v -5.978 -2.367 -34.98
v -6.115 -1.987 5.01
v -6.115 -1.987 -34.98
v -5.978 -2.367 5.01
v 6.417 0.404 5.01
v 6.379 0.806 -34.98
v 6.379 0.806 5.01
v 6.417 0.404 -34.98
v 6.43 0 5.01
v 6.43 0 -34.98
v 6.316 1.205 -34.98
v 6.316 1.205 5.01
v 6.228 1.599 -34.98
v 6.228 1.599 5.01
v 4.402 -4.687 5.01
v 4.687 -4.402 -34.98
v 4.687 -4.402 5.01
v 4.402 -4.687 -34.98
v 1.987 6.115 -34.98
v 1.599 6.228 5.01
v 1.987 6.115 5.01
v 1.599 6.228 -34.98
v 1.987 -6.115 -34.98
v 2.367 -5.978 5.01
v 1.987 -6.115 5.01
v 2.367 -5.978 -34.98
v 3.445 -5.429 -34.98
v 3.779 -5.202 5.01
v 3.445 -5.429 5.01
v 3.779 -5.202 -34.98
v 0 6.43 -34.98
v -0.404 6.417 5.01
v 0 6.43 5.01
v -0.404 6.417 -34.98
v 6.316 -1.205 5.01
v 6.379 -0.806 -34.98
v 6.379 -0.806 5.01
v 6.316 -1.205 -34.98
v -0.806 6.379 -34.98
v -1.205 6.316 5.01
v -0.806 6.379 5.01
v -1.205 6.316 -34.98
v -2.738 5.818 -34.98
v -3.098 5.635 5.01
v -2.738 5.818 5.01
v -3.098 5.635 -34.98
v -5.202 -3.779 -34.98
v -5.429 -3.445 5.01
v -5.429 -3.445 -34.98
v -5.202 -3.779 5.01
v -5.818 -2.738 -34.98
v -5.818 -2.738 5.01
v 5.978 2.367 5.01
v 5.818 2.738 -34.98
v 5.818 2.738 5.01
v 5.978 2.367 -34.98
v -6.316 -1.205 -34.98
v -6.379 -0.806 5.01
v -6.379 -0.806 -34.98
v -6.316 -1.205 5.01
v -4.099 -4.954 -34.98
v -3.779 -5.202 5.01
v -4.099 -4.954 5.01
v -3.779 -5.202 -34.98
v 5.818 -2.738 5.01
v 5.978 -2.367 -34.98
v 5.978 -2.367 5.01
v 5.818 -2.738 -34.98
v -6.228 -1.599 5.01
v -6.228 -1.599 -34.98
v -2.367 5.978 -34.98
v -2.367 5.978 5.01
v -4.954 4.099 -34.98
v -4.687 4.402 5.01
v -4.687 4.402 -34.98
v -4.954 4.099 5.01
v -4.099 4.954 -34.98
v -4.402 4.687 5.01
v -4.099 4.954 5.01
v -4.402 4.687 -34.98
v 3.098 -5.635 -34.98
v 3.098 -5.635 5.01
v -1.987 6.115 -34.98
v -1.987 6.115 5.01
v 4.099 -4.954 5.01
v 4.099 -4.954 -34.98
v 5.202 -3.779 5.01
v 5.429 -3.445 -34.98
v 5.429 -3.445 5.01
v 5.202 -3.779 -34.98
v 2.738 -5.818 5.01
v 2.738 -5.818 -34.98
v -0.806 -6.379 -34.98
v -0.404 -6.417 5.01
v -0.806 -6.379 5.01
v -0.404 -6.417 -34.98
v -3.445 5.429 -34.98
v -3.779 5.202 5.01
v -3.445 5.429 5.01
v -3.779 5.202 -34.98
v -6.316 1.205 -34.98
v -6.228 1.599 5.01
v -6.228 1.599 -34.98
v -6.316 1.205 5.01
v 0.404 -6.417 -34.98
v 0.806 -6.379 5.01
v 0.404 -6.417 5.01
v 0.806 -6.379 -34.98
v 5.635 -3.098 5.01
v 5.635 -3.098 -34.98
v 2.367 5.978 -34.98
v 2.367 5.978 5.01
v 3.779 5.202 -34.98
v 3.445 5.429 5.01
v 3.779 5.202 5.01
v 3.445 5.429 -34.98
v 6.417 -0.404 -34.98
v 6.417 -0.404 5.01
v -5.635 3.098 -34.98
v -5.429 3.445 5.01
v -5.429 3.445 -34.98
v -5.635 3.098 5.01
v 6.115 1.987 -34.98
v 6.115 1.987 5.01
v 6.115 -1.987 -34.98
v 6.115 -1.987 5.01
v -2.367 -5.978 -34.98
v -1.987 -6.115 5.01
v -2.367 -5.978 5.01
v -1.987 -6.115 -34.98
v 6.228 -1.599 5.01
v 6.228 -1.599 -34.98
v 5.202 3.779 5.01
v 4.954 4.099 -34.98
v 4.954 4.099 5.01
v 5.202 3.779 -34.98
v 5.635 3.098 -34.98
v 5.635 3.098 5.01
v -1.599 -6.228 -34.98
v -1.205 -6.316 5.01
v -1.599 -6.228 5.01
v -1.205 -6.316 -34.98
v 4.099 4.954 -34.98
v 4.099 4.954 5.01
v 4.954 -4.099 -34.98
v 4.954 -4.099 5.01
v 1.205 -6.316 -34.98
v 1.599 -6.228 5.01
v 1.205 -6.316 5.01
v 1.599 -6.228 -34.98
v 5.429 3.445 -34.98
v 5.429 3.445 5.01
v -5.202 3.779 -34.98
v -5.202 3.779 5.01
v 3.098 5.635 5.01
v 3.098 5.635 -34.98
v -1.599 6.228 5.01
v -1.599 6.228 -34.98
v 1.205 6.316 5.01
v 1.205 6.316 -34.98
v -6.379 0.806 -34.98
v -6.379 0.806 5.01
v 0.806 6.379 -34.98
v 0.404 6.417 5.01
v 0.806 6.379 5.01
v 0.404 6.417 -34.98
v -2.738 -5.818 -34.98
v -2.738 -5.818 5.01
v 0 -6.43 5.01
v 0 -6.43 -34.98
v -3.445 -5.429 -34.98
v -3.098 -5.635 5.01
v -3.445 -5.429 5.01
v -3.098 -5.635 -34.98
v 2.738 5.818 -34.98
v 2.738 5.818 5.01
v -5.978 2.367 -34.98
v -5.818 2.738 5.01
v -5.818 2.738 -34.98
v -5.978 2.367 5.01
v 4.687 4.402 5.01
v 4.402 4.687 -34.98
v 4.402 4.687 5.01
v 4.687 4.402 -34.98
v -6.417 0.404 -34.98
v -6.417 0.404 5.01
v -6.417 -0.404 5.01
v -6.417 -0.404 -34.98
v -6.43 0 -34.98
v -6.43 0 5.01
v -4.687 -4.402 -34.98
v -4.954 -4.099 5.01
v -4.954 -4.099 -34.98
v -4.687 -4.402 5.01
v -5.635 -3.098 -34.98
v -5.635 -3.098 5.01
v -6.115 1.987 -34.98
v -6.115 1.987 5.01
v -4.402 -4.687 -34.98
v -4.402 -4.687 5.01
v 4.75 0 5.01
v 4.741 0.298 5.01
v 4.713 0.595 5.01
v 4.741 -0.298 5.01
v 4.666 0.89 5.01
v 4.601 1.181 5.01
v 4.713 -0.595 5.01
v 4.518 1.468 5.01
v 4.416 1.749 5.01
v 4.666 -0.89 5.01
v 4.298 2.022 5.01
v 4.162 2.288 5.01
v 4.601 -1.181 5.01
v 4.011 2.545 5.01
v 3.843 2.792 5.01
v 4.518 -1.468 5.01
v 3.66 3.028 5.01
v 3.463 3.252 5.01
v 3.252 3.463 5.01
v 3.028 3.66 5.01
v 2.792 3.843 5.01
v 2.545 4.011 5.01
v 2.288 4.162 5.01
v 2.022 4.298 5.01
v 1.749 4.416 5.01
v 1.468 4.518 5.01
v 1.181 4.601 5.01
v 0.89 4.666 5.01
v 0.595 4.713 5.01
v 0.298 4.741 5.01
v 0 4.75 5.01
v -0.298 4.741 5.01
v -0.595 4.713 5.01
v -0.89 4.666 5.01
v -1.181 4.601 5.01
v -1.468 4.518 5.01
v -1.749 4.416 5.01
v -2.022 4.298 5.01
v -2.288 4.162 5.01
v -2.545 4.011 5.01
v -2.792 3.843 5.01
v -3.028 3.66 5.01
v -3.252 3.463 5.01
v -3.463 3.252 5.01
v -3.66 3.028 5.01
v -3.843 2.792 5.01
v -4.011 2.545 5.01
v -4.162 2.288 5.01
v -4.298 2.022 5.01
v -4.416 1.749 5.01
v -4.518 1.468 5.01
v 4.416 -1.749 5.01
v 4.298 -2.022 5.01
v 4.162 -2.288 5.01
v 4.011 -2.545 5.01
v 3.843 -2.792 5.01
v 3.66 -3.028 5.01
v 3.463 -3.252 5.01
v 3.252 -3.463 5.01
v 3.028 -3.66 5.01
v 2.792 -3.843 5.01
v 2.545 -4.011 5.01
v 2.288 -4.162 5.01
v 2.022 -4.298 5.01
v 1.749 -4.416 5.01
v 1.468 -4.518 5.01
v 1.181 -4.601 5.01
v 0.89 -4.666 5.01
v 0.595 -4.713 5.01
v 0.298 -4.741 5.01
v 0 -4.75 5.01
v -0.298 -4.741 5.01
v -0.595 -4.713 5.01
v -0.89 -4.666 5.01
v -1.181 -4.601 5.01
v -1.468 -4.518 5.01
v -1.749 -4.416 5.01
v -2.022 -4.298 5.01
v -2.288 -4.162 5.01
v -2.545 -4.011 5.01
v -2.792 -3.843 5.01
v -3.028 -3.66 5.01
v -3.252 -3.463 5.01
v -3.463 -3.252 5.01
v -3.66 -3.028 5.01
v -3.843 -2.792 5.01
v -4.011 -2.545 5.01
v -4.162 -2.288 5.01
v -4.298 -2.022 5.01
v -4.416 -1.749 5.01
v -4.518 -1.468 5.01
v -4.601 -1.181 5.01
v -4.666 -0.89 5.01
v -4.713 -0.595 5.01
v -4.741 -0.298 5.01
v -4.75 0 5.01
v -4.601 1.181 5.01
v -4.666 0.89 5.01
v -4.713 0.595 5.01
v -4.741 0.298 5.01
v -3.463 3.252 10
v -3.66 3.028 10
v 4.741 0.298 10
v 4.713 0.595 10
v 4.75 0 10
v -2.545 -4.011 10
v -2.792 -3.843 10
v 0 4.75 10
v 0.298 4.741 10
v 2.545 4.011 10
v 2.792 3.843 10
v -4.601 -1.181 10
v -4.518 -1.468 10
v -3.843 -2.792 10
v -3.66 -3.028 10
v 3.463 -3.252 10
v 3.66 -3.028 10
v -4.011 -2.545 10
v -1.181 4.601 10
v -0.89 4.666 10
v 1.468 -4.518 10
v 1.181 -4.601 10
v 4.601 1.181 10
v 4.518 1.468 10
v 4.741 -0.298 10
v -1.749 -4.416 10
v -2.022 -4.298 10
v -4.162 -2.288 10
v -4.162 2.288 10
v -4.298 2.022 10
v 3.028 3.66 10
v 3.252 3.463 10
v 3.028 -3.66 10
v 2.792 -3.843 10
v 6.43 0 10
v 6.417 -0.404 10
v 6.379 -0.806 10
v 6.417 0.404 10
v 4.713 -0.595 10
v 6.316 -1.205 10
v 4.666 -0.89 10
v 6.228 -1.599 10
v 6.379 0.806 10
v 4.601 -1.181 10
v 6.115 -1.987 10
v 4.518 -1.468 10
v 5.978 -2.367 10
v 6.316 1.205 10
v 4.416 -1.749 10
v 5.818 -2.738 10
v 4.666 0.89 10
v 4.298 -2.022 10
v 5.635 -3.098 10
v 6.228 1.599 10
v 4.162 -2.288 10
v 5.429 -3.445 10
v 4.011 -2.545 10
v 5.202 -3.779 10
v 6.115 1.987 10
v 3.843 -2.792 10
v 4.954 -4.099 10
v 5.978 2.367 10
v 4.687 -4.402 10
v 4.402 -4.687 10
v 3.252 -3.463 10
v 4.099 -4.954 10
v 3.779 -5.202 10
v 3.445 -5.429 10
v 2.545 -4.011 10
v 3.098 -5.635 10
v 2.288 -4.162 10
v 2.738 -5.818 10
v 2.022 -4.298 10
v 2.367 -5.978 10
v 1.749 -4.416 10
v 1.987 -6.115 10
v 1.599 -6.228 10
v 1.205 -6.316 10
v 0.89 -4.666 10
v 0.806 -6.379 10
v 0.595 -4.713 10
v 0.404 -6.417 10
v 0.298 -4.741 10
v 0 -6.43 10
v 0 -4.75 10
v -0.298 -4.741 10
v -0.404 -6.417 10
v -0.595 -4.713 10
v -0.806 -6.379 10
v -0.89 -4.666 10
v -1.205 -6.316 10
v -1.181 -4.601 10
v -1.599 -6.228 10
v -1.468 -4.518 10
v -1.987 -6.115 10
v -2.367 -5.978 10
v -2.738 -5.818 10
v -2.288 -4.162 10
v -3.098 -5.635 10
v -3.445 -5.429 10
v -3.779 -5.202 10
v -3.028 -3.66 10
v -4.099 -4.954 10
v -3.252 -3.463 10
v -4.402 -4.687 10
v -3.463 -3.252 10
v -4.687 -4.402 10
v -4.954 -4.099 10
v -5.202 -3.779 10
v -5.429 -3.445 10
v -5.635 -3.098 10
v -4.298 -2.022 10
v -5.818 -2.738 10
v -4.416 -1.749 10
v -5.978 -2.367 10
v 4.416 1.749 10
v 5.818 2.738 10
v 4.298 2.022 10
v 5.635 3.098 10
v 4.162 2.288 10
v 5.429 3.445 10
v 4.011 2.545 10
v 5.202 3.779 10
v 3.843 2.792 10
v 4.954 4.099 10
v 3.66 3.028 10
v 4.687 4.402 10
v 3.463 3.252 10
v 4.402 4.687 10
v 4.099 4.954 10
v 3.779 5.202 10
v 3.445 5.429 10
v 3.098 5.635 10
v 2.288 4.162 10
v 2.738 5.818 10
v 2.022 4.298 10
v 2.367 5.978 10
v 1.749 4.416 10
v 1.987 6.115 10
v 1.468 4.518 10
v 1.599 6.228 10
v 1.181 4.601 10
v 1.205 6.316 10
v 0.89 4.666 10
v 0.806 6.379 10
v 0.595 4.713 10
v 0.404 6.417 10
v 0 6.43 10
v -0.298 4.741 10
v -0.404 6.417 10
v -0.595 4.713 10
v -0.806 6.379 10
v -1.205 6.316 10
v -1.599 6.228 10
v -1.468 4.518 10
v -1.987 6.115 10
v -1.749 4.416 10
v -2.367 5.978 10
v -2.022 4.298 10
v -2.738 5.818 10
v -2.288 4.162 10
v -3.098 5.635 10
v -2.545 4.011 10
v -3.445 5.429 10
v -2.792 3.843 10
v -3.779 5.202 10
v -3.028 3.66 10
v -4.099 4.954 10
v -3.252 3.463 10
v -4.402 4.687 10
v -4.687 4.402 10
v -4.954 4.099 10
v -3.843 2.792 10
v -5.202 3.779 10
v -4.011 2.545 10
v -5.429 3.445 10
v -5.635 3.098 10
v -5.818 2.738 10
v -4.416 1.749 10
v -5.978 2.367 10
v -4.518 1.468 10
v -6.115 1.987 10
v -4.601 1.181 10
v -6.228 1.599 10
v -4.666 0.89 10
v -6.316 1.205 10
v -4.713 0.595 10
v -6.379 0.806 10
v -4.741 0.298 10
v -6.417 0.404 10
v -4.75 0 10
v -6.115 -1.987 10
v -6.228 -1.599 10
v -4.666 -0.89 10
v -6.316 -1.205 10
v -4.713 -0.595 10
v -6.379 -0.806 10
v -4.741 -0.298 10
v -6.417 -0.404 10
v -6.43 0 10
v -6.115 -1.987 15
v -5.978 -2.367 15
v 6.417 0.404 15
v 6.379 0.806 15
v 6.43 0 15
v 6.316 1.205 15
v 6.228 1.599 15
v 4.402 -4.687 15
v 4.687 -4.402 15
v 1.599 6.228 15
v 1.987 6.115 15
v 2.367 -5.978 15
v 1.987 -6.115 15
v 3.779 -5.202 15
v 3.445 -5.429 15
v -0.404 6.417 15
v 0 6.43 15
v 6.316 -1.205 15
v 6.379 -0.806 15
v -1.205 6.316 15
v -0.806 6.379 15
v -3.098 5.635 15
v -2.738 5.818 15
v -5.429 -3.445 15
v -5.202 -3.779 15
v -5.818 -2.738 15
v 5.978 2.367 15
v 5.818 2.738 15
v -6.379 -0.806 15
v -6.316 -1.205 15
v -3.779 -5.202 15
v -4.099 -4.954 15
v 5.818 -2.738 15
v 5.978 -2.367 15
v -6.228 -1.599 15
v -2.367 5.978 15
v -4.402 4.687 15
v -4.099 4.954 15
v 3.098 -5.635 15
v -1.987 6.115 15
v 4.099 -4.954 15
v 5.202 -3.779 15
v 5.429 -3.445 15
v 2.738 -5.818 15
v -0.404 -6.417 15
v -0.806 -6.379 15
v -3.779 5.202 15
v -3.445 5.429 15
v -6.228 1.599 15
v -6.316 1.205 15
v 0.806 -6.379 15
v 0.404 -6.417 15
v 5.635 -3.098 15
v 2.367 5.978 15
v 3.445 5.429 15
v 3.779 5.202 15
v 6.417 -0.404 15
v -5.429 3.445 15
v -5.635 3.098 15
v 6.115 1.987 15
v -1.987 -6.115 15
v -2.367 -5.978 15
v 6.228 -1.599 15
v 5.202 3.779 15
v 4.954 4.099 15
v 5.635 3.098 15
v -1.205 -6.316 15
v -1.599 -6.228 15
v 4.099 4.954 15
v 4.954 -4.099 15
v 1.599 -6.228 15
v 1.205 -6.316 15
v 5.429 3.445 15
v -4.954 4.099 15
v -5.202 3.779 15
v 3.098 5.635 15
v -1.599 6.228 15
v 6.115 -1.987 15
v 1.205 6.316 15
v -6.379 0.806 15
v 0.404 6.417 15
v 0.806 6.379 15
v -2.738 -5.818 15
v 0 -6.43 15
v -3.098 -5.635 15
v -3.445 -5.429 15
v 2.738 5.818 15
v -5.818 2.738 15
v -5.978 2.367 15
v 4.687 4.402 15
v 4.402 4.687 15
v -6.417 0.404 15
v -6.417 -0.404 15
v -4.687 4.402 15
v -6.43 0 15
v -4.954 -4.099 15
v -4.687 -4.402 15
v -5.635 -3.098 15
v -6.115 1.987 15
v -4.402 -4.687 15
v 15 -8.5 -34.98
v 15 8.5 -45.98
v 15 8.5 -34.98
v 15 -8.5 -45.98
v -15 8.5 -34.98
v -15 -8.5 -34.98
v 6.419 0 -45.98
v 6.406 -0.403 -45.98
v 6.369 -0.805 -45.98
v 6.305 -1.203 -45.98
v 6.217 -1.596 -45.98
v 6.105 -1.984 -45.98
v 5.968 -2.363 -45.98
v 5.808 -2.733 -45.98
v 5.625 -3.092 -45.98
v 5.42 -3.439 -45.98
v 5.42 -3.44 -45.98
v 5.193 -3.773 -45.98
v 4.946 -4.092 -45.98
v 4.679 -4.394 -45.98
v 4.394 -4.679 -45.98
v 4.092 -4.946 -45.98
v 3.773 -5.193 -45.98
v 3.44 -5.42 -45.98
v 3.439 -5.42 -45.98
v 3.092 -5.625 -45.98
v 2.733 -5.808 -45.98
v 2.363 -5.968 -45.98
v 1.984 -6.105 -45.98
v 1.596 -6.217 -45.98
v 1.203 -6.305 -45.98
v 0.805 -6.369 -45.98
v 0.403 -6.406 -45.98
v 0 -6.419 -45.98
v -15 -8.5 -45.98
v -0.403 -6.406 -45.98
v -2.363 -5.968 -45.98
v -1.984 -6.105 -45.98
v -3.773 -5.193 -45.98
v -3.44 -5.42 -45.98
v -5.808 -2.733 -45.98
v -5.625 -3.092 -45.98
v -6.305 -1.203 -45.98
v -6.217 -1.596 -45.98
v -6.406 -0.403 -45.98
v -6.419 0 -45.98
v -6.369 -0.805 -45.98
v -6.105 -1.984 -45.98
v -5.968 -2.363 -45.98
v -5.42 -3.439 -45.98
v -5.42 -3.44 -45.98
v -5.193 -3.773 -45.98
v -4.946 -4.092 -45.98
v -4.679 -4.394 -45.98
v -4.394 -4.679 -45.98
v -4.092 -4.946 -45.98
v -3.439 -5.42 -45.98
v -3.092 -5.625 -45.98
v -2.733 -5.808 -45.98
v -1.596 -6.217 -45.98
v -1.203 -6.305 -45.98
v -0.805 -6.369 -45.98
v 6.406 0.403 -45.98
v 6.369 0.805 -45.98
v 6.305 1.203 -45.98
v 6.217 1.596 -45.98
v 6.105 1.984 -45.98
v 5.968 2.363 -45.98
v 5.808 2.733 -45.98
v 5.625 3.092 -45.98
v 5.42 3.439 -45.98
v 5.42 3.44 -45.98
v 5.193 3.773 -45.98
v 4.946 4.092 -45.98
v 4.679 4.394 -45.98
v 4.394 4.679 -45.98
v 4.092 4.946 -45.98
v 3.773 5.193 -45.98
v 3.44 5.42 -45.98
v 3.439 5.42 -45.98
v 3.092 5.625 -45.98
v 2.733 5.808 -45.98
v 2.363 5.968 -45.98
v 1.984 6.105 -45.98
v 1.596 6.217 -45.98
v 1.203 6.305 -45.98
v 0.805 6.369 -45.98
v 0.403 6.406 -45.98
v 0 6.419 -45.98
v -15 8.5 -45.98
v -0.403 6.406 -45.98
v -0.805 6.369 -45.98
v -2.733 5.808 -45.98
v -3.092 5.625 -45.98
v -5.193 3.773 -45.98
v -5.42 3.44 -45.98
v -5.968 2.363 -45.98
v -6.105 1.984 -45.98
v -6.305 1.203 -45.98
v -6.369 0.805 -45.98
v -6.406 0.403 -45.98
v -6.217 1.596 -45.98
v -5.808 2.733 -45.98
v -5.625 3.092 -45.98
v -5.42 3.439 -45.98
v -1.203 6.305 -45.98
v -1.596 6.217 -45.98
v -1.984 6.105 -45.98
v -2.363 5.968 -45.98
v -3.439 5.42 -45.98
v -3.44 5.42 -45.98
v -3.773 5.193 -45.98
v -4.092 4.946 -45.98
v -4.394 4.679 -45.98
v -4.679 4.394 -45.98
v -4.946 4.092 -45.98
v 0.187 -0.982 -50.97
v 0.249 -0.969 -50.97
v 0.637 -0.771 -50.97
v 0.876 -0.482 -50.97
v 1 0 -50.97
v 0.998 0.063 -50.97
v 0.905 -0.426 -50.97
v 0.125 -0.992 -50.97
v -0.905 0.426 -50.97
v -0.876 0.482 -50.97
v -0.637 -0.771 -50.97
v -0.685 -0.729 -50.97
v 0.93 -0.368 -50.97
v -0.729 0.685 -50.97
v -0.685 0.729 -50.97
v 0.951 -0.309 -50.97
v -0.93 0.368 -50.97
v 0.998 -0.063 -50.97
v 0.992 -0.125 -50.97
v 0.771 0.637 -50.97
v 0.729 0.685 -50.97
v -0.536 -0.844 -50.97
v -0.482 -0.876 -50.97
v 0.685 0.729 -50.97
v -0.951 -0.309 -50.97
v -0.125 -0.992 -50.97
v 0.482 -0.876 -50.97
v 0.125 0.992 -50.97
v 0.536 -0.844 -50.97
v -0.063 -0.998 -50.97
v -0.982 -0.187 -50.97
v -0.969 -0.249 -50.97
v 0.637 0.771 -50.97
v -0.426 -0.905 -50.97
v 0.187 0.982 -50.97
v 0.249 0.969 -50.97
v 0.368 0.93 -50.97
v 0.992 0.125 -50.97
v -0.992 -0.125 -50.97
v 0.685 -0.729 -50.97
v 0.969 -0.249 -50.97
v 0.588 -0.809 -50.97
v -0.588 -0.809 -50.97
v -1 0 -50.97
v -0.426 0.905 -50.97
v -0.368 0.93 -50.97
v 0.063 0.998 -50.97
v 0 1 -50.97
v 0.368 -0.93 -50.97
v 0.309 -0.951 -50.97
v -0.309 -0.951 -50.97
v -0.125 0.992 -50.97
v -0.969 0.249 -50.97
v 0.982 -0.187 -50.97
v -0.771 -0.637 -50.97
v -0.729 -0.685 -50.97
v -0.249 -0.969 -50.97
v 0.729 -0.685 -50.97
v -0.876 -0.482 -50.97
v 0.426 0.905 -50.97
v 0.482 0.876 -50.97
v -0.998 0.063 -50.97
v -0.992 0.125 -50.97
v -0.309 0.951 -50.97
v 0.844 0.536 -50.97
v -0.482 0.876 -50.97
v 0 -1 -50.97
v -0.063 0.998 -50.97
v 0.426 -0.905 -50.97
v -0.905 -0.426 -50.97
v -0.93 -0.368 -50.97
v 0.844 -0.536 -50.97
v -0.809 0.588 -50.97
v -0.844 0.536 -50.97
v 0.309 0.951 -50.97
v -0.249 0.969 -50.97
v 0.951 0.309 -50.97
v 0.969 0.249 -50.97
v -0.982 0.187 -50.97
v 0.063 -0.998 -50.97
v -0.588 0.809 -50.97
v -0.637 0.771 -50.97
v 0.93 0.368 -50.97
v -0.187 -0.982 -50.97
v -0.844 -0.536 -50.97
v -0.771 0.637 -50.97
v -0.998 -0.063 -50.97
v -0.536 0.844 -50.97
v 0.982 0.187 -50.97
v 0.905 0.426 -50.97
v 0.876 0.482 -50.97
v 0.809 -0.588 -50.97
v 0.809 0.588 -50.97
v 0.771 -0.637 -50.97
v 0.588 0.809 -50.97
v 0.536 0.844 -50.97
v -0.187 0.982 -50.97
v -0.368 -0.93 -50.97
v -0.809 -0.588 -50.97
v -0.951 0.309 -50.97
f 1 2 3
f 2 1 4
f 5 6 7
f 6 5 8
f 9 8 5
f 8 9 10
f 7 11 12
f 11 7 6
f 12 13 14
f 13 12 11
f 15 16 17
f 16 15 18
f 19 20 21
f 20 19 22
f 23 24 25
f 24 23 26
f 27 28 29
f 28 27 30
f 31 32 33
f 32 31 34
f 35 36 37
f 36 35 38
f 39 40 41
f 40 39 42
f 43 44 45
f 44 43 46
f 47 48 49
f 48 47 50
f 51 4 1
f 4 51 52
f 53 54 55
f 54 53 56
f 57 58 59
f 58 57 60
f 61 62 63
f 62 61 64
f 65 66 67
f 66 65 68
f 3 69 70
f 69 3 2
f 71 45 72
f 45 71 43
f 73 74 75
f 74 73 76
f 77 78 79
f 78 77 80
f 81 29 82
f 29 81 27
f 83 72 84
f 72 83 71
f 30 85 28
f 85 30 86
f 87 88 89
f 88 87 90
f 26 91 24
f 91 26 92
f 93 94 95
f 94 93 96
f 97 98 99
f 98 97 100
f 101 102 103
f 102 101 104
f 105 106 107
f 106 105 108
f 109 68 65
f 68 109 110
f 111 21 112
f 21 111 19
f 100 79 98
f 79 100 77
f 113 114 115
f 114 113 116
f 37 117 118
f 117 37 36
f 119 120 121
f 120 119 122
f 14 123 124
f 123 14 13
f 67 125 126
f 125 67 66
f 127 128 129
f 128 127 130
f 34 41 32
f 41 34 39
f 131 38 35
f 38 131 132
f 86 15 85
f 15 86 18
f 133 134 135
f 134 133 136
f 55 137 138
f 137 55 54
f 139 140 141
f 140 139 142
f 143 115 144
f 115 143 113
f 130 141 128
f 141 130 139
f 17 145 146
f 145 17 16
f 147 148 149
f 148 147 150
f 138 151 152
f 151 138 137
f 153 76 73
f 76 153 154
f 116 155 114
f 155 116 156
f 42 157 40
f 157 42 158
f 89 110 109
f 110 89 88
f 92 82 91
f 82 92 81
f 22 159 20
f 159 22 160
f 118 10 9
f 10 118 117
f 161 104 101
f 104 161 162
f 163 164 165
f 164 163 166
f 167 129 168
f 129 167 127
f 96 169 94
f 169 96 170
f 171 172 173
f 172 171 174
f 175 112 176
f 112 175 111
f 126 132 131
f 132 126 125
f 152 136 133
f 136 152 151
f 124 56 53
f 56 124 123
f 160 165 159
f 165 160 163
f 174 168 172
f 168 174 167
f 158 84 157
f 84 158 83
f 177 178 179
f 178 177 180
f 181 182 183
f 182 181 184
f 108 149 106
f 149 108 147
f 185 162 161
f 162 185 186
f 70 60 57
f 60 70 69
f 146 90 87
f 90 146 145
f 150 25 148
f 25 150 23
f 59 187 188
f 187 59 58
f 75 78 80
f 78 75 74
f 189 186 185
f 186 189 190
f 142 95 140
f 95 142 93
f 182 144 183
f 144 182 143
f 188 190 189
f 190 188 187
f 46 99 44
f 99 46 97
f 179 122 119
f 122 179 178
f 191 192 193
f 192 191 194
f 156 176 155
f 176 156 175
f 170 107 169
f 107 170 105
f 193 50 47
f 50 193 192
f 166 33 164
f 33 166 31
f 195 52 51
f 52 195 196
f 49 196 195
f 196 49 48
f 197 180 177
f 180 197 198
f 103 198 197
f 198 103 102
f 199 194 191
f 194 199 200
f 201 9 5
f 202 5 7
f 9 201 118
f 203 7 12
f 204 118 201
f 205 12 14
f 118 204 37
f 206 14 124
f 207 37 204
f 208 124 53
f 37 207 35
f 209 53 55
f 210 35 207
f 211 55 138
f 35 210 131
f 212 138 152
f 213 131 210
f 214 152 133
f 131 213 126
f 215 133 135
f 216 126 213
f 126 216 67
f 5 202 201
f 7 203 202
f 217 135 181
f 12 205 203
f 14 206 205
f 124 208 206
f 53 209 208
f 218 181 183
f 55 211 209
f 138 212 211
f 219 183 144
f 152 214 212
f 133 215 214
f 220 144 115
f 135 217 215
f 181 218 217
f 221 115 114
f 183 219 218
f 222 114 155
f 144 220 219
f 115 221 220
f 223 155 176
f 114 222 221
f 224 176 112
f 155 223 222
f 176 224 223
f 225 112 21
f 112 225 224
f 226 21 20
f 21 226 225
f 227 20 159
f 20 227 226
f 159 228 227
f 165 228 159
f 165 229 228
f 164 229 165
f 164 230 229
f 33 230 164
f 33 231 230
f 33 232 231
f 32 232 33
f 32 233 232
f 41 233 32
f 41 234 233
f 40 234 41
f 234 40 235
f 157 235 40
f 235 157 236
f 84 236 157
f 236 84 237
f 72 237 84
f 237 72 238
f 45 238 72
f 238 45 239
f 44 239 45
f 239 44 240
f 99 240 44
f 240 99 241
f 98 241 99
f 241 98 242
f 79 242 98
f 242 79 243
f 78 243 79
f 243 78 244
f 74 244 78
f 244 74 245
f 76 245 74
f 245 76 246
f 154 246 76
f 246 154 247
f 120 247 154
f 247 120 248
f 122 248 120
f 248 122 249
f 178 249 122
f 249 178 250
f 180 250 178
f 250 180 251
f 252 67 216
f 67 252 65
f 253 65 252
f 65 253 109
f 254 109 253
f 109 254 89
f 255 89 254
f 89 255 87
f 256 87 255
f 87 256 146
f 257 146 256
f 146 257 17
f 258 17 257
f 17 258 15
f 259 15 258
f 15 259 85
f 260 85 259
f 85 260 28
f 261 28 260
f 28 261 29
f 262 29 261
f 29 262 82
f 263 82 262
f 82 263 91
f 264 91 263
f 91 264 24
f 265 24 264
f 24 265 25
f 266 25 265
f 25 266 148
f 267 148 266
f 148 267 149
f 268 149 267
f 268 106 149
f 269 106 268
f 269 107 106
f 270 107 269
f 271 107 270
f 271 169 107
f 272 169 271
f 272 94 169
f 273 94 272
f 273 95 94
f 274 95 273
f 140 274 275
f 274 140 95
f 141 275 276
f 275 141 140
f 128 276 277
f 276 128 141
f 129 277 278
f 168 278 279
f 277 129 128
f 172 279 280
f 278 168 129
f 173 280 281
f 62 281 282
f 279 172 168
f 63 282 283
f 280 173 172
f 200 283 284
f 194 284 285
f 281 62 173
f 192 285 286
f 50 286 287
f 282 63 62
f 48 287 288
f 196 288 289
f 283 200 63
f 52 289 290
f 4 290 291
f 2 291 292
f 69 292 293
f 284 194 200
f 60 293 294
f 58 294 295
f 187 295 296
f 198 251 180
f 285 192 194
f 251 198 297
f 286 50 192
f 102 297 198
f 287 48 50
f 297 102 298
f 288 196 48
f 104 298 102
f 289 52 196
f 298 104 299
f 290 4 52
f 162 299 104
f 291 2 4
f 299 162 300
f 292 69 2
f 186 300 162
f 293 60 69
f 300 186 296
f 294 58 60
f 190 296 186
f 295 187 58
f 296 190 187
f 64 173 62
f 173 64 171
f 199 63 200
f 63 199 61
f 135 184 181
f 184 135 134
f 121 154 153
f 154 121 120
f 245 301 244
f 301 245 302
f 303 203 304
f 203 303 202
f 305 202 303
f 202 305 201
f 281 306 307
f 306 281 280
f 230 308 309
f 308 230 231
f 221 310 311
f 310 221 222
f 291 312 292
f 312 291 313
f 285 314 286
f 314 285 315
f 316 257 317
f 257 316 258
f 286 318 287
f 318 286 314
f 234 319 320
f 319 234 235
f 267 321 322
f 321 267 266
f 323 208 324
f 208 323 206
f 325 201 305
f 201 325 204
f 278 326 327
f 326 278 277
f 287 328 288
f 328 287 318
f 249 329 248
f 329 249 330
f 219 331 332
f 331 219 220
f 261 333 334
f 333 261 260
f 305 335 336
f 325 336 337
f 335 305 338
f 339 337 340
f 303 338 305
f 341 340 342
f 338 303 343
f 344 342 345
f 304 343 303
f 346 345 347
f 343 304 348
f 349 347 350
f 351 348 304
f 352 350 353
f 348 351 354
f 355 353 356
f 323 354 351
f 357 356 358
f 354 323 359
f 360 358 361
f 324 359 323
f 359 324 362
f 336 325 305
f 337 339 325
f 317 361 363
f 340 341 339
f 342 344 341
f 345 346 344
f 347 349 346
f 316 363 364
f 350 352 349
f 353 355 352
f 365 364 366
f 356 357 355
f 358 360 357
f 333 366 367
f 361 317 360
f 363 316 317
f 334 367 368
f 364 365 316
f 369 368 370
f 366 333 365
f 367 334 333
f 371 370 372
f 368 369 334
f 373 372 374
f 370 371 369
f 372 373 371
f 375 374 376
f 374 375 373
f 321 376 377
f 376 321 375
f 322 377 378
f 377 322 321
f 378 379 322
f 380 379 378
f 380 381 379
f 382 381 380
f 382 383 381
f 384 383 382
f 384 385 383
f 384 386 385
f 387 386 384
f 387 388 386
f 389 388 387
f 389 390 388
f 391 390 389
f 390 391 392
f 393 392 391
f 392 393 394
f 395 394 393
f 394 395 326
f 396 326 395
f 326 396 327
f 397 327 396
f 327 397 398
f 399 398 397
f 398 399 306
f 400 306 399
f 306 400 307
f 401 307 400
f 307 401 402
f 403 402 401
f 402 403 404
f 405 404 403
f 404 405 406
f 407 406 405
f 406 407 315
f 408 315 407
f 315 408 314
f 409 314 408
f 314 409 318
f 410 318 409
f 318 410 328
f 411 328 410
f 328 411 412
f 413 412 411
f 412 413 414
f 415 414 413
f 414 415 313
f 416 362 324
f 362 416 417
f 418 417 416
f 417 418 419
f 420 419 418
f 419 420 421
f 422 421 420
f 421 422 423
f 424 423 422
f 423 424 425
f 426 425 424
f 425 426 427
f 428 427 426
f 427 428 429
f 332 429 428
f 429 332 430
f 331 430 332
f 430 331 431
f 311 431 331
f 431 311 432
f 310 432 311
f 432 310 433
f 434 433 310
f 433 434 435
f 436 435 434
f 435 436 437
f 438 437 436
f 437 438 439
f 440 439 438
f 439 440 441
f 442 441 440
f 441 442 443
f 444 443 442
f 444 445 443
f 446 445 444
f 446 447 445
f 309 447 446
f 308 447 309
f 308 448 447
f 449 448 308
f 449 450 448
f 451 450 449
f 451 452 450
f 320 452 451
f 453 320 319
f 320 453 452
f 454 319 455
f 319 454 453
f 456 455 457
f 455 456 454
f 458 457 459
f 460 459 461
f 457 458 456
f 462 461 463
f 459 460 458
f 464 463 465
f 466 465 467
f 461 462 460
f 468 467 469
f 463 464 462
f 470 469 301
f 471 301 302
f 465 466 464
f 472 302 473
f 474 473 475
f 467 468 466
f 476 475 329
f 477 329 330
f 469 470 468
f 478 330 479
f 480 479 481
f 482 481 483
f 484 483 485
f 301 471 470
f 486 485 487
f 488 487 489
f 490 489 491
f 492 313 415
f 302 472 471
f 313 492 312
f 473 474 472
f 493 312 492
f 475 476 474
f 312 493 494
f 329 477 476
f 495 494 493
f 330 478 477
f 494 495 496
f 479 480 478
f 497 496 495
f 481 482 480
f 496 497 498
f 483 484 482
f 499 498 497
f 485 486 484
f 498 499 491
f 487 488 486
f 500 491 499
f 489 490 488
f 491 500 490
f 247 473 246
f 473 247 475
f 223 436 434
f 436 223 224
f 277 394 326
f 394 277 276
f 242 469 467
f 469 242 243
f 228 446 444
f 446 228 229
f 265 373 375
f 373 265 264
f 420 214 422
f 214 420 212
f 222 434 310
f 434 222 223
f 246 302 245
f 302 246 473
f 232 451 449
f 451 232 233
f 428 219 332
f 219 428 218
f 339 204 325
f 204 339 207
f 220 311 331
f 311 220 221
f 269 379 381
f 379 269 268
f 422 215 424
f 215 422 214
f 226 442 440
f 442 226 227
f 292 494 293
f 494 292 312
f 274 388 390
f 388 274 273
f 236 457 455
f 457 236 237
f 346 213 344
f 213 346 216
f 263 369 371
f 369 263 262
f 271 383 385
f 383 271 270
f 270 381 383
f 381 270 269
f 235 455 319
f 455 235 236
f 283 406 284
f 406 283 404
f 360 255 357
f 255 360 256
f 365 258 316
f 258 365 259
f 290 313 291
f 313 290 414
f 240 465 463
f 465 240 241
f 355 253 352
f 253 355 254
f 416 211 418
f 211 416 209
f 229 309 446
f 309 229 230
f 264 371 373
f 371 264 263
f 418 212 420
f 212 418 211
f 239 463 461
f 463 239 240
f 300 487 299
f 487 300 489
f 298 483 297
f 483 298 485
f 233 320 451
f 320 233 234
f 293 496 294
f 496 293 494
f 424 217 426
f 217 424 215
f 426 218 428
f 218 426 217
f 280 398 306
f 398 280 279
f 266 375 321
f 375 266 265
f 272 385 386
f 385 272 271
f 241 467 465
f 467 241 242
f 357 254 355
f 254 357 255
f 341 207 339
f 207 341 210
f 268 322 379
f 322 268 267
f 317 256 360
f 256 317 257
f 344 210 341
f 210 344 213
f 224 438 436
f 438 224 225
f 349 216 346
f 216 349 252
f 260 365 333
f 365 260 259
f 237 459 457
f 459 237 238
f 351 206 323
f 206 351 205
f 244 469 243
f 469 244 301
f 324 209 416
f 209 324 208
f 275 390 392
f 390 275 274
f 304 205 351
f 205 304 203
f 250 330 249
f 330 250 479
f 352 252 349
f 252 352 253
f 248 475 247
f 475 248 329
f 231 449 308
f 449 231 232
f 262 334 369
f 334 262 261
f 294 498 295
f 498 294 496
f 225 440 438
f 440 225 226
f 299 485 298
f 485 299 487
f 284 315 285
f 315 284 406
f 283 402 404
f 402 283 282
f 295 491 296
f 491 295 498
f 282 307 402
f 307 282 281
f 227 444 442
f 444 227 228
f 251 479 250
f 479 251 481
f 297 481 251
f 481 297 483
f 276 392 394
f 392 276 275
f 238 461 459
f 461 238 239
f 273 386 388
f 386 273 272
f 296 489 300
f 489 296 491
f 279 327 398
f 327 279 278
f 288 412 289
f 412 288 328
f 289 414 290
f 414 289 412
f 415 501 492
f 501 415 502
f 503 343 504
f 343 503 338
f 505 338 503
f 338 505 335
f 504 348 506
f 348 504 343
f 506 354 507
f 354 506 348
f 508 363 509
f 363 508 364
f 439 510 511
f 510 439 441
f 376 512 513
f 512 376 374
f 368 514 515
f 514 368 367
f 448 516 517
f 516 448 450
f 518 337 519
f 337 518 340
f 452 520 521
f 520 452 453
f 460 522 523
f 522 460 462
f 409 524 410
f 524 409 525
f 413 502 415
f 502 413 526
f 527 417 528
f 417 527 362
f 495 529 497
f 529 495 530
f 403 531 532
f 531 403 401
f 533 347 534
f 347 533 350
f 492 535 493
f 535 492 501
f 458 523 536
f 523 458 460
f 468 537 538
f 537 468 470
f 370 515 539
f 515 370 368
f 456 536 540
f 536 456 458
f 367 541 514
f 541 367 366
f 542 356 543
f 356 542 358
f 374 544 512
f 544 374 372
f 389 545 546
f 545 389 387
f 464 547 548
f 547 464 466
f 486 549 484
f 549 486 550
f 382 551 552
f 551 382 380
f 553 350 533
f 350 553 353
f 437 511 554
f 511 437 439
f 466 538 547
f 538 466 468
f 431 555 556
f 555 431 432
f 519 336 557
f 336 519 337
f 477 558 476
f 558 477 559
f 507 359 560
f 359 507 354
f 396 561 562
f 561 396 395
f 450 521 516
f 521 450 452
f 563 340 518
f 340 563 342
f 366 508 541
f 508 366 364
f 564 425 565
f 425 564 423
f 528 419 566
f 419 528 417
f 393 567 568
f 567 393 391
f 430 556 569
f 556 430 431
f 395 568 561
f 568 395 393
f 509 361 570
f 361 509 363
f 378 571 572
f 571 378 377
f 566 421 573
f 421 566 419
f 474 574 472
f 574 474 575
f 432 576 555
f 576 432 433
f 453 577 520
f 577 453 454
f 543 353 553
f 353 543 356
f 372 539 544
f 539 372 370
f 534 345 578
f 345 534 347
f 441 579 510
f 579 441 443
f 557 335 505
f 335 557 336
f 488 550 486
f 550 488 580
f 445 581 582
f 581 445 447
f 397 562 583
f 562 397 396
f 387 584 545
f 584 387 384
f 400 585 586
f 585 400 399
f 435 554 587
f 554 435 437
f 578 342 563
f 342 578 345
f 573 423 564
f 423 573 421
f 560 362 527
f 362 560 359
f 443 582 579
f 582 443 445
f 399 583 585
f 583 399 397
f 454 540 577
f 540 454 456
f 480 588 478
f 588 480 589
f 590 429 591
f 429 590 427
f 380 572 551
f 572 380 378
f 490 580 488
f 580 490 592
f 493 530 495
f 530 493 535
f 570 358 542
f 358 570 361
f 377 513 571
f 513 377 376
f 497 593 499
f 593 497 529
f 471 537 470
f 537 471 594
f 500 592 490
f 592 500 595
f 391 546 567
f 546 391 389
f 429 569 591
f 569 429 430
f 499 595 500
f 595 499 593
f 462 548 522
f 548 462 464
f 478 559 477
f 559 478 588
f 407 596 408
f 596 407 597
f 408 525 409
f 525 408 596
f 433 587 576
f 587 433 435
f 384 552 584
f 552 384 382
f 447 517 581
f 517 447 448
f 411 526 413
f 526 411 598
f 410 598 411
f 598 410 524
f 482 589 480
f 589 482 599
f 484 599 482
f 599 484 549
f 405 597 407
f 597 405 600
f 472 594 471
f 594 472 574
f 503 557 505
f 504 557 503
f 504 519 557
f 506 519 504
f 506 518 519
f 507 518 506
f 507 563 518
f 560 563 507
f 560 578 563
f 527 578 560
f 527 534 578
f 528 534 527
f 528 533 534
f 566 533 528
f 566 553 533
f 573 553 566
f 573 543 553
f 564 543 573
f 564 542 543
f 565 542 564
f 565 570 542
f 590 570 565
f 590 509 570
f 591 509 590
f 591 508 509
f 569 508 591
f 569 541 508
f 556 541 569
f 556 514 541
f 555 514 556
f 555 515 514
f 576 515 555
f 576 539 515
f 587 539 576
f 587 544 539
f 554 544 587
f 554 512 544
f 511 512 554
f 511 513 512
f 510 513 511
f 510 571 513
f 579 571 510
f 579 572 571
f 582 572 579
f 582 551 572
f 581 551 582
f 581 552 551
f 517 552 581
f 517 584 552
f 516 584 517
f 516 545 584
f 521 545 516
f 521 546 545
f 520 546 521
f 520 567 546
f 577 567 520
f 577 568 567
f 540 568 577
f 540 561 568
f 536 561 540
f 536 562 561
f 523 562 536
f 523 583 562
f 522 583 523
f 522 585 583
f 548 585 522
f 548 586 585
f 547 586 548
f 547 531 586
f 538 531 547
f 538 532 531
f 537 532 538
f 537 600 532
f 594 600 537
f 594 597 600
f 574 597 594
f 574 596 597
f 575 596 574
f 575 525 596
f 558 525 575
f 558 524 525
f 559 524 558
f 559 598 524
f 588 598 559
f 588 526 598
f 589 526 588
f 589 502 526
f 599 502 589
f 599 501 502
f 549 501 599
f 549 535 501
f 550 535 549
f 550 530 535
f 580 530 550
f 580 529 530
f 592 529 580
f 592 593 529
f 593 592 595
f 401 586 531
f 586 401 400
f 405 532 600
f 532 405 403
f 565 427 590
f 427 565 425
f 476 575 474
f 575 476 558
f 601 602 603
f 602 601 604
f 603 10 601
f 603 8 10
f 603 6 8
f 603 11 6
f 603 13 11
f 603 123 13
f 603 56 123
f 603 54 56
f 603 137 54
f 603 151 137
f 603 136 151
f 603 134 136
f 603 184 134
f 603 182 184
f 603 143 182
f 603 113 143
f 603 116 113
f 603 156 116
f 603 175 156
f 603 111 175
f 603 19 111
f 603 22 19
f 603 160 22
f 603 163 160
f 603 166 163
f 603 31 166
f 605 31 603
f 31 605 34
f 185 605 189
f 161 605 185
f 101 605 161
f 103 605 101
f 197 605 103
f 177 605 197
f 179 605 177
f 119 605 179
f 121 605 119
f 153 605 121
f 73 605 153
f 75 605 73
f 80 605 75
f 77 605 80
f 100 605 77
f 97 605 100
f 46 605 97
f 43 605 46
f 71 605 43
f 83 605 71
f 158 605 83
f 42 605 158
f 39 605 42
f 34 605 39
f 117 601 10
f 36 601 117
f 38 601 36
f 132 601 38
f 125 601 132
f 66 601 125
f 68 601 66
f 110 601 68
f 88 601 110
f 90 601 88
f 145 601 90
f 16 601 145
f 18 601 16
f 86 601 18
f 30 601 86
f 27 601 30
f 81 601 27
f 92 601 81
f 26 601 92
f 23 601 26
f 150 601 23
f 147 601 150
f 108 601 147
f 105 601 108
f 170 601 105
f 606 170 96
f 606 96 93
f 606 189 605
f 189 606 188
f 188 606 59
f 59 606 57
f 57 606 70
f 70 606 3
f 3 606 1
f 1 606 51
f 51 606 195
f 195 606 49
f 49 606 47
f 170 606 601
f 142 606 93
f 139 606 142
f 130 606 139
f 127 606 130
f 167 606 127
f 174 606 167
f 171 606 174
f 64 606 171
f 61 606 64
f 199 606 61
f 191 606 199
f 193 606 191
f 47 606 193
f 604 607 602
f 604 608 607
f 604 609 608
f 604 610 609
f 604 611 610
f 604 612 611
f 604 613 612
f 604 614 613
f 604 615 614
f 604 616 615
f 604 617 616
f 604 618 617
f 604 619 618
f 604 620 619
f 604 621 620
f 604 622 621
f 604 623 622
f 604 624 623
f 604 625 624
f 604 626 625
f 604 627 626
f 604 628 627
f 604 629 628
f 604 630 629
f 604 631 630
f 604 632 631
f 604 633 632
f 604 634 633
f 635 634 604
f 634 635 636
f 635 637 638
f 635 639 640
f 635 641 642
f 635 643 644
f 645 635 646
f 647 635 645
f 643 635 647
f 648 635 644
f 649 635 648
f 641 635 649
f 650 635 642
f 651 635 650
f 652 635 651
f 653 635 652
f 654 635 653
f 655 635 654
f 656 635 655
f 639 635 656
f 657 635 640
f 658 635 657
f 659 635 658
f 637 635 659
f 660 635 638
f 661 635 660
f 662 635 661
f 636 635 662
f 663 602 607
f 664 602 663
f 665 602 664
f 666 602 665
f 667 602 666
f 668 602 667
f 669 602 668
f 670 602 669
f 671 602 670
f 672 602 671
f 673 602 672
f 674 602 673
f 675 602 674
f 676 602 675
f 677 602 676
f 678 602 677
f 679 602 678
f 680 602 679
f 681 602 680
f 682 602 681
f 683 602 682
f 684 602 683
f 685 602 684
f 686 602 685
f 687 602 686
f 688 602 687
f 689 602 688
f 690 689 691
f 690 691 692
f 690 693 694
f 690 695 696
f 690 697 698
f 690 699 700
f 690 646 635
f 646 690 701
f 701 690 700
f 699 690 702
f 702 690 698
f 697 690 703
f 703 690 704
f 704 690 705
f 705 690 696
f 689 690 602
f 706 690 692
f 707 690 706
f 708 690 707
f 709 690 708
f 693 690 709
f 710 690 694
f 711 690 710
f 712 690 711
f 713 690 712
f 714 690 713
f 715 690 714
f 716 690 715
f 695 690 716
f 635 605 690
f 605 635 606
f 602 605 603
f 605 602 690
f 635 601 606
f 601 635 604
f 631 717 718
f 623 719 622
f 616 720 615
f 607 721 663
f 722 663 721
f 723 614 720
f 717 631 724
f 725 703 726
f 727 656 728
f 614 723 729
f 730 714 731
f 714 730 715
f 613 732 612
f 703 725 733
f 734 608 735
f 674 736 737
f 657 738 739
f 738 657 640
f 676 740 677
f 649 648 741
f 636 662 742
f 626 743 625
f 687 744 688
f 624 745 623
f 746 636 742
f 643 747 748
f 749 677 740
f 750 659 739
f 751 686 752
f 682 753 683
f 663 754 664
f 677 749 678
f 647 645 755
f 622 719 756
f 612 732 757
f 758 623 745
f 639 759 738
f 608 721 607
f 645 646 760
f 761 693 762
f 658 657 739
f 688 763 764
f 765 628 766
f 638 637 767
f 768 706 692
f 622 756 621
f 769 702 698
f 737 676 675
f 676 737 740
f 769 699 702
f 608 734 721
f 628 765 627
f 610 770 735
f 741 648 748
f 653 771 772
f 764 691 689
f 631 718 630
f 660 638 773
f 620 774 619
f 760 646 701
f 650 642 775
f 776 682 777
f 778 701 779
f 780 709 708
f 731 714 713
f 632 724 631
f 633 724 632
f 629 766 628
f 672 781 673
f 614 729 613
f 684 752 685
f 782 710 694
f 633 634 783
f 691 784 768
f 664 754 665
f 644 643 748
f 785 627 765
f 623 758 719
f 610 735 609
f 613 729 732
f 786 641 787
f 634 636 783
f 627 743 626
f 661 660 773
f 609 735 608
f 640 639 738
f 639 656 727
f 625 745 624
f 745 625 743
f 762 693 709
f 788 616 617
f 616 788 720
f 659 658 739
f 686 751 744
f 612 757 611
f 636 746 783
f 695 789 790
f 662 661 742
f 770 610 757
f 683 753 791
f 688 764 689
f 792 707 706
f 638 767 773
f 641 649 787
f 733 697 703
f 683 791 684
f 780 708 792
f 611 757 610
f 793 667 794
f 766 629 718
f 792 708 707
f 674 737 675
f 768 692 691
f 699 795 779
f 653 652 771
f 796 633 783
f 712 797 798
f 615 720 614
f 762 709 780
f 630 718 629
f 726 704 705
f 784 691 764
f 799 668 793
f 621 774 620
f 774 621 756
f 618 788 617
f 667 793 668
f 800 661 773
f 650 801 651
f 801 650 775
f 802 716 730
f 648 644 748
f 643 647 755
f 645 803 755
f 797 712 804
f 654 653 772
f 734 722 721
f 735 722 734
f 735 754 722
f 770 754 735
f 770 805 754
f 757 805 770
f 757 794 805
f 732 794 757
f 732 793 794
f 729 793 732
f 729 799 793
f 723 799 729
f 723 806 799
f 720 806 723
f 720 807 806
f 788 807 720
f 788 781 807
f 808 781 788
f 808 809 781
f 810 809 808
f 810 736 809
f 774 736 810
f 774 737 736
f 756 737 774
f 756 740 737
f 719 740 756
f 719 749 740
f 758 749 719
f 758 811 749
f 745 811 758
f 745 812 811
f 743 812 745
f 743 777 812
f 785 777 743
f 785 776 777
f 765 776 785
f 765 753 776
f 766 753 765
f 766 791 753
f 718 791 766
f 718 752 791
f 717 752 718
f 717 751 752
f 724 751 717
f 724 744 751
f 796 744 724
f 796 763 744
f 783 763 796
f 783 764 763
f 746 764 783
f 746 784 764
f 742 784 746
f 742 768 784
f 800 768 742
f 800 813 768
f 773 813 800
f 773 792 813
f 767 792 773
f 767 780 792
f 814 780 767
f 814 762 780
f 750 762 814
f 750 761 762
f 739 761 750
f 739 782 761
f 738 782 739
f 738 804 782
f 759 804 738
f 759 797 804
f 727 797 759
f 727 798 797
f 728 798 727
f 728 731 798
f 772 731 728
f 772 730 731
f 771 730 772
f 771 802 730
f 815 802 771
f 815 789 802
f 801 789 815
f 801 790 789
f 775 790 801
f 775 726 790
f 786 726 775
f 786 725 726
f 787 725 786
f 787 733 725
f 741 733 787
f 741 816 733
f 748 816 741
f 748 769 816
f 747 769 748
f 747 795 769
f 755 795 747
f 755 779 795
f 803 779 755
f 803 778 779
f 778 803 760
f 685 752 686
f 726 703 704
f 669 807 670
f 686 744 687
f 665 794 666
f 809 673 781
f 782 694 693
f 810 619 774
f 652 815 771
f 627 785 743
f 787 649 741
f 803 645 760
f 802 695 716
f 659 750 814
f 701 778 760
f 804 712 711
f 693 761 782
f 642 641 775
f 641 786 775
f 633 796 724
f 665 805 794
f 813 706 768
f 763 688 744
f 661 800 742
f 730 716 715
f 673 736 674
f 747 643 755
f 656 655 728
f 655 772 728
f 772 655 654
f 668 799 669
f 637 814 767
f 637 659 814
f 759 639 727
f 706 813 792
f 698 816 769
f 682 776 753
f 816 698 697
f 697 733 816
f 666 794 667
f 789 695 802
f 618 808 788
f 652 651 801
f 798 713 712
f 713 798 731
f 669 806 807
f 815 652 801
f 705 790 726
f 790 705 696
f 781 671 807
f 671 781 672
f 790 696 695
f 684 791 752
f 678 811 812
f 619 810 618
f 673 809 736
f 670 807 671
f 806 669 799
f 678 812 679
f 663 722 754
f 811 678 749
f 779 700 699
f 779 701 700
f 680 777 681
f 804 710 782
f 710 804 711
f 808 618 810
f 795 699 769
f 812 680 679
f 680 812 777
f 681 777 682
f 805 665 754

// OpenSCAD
// file: _inc-hot-end.scad
//TranKILLoman's extruder

/*
*L'extrudeur de tranKILLoman qui servira à la reprap
* et qui a des dimmensions bizares
*/

$fn=100;

module extrudeur(){
	translate([0,0,15.98])
		cylinder(r=6.43, h=40);
	translate([0,0,55.97])
		cylinder(r=4.75, h=5);
	translate([0,0,60.97])
		cylinder(r=6.43, h=5);
	translate([-15,-8.5,4.99])	cube([30,17,11]);
	cylinder(r1=1,r2=6.43, h=5);
}
extrudeur();
// main file
/*
Projet ReprapJeanne

Plateforme pour Jhead-mini
Deux pièces, la plate forme, et une pièce pour bloquer la buse


github: https://github.com/gnieark/reprapJeanne
wiki https://mail.jeannedhack.org/wicked/display.php?page=reprap_geante

By Gnieark https://blog-du-grouik.tinad.fr
& TranKILLoman   

License GNU-GPL V3

*/


use <_inc-hot-end.scad>;
translate([0,0,-50.97]) extrudeur();




//la plate forme
difference(){
	linear_extrude (height=5)
	import (file="platform.dxf", layer="0", $fn=100);
	union(){
	translate([6.0656,44.5,2.5])
		rotate([90,0,30])
			cylinder(r=1.5, h=72 ,$fn=100);
	translate([-6.0656,44.5,2.5])
		rotate([90,0,-30])
			cylinder(r=1.5, h=72 ,$fn=100);
	translate([-36.4,-28.25,2.5])
		rotate([90,0,90])
			cylinder(r=1.5, h=72 ,$fn=100);
	}
}


//le système de bloquage de la J-HEAD mini
linear_extrude (height=5.02)
	import (file="platform.dxf", layer="Lock-system-0-5", $fn=100);

translate([0,0,5.01])
	linear_extrude (height=5)
		import (file="platform.dxf", layer="Lock-system-5-10", $fn=100);
translate([0,0,10])
		linear_extrude (height=5)
			import (file="platform.dxf", layer="Lock-system-10-15", $fn=100);
		
